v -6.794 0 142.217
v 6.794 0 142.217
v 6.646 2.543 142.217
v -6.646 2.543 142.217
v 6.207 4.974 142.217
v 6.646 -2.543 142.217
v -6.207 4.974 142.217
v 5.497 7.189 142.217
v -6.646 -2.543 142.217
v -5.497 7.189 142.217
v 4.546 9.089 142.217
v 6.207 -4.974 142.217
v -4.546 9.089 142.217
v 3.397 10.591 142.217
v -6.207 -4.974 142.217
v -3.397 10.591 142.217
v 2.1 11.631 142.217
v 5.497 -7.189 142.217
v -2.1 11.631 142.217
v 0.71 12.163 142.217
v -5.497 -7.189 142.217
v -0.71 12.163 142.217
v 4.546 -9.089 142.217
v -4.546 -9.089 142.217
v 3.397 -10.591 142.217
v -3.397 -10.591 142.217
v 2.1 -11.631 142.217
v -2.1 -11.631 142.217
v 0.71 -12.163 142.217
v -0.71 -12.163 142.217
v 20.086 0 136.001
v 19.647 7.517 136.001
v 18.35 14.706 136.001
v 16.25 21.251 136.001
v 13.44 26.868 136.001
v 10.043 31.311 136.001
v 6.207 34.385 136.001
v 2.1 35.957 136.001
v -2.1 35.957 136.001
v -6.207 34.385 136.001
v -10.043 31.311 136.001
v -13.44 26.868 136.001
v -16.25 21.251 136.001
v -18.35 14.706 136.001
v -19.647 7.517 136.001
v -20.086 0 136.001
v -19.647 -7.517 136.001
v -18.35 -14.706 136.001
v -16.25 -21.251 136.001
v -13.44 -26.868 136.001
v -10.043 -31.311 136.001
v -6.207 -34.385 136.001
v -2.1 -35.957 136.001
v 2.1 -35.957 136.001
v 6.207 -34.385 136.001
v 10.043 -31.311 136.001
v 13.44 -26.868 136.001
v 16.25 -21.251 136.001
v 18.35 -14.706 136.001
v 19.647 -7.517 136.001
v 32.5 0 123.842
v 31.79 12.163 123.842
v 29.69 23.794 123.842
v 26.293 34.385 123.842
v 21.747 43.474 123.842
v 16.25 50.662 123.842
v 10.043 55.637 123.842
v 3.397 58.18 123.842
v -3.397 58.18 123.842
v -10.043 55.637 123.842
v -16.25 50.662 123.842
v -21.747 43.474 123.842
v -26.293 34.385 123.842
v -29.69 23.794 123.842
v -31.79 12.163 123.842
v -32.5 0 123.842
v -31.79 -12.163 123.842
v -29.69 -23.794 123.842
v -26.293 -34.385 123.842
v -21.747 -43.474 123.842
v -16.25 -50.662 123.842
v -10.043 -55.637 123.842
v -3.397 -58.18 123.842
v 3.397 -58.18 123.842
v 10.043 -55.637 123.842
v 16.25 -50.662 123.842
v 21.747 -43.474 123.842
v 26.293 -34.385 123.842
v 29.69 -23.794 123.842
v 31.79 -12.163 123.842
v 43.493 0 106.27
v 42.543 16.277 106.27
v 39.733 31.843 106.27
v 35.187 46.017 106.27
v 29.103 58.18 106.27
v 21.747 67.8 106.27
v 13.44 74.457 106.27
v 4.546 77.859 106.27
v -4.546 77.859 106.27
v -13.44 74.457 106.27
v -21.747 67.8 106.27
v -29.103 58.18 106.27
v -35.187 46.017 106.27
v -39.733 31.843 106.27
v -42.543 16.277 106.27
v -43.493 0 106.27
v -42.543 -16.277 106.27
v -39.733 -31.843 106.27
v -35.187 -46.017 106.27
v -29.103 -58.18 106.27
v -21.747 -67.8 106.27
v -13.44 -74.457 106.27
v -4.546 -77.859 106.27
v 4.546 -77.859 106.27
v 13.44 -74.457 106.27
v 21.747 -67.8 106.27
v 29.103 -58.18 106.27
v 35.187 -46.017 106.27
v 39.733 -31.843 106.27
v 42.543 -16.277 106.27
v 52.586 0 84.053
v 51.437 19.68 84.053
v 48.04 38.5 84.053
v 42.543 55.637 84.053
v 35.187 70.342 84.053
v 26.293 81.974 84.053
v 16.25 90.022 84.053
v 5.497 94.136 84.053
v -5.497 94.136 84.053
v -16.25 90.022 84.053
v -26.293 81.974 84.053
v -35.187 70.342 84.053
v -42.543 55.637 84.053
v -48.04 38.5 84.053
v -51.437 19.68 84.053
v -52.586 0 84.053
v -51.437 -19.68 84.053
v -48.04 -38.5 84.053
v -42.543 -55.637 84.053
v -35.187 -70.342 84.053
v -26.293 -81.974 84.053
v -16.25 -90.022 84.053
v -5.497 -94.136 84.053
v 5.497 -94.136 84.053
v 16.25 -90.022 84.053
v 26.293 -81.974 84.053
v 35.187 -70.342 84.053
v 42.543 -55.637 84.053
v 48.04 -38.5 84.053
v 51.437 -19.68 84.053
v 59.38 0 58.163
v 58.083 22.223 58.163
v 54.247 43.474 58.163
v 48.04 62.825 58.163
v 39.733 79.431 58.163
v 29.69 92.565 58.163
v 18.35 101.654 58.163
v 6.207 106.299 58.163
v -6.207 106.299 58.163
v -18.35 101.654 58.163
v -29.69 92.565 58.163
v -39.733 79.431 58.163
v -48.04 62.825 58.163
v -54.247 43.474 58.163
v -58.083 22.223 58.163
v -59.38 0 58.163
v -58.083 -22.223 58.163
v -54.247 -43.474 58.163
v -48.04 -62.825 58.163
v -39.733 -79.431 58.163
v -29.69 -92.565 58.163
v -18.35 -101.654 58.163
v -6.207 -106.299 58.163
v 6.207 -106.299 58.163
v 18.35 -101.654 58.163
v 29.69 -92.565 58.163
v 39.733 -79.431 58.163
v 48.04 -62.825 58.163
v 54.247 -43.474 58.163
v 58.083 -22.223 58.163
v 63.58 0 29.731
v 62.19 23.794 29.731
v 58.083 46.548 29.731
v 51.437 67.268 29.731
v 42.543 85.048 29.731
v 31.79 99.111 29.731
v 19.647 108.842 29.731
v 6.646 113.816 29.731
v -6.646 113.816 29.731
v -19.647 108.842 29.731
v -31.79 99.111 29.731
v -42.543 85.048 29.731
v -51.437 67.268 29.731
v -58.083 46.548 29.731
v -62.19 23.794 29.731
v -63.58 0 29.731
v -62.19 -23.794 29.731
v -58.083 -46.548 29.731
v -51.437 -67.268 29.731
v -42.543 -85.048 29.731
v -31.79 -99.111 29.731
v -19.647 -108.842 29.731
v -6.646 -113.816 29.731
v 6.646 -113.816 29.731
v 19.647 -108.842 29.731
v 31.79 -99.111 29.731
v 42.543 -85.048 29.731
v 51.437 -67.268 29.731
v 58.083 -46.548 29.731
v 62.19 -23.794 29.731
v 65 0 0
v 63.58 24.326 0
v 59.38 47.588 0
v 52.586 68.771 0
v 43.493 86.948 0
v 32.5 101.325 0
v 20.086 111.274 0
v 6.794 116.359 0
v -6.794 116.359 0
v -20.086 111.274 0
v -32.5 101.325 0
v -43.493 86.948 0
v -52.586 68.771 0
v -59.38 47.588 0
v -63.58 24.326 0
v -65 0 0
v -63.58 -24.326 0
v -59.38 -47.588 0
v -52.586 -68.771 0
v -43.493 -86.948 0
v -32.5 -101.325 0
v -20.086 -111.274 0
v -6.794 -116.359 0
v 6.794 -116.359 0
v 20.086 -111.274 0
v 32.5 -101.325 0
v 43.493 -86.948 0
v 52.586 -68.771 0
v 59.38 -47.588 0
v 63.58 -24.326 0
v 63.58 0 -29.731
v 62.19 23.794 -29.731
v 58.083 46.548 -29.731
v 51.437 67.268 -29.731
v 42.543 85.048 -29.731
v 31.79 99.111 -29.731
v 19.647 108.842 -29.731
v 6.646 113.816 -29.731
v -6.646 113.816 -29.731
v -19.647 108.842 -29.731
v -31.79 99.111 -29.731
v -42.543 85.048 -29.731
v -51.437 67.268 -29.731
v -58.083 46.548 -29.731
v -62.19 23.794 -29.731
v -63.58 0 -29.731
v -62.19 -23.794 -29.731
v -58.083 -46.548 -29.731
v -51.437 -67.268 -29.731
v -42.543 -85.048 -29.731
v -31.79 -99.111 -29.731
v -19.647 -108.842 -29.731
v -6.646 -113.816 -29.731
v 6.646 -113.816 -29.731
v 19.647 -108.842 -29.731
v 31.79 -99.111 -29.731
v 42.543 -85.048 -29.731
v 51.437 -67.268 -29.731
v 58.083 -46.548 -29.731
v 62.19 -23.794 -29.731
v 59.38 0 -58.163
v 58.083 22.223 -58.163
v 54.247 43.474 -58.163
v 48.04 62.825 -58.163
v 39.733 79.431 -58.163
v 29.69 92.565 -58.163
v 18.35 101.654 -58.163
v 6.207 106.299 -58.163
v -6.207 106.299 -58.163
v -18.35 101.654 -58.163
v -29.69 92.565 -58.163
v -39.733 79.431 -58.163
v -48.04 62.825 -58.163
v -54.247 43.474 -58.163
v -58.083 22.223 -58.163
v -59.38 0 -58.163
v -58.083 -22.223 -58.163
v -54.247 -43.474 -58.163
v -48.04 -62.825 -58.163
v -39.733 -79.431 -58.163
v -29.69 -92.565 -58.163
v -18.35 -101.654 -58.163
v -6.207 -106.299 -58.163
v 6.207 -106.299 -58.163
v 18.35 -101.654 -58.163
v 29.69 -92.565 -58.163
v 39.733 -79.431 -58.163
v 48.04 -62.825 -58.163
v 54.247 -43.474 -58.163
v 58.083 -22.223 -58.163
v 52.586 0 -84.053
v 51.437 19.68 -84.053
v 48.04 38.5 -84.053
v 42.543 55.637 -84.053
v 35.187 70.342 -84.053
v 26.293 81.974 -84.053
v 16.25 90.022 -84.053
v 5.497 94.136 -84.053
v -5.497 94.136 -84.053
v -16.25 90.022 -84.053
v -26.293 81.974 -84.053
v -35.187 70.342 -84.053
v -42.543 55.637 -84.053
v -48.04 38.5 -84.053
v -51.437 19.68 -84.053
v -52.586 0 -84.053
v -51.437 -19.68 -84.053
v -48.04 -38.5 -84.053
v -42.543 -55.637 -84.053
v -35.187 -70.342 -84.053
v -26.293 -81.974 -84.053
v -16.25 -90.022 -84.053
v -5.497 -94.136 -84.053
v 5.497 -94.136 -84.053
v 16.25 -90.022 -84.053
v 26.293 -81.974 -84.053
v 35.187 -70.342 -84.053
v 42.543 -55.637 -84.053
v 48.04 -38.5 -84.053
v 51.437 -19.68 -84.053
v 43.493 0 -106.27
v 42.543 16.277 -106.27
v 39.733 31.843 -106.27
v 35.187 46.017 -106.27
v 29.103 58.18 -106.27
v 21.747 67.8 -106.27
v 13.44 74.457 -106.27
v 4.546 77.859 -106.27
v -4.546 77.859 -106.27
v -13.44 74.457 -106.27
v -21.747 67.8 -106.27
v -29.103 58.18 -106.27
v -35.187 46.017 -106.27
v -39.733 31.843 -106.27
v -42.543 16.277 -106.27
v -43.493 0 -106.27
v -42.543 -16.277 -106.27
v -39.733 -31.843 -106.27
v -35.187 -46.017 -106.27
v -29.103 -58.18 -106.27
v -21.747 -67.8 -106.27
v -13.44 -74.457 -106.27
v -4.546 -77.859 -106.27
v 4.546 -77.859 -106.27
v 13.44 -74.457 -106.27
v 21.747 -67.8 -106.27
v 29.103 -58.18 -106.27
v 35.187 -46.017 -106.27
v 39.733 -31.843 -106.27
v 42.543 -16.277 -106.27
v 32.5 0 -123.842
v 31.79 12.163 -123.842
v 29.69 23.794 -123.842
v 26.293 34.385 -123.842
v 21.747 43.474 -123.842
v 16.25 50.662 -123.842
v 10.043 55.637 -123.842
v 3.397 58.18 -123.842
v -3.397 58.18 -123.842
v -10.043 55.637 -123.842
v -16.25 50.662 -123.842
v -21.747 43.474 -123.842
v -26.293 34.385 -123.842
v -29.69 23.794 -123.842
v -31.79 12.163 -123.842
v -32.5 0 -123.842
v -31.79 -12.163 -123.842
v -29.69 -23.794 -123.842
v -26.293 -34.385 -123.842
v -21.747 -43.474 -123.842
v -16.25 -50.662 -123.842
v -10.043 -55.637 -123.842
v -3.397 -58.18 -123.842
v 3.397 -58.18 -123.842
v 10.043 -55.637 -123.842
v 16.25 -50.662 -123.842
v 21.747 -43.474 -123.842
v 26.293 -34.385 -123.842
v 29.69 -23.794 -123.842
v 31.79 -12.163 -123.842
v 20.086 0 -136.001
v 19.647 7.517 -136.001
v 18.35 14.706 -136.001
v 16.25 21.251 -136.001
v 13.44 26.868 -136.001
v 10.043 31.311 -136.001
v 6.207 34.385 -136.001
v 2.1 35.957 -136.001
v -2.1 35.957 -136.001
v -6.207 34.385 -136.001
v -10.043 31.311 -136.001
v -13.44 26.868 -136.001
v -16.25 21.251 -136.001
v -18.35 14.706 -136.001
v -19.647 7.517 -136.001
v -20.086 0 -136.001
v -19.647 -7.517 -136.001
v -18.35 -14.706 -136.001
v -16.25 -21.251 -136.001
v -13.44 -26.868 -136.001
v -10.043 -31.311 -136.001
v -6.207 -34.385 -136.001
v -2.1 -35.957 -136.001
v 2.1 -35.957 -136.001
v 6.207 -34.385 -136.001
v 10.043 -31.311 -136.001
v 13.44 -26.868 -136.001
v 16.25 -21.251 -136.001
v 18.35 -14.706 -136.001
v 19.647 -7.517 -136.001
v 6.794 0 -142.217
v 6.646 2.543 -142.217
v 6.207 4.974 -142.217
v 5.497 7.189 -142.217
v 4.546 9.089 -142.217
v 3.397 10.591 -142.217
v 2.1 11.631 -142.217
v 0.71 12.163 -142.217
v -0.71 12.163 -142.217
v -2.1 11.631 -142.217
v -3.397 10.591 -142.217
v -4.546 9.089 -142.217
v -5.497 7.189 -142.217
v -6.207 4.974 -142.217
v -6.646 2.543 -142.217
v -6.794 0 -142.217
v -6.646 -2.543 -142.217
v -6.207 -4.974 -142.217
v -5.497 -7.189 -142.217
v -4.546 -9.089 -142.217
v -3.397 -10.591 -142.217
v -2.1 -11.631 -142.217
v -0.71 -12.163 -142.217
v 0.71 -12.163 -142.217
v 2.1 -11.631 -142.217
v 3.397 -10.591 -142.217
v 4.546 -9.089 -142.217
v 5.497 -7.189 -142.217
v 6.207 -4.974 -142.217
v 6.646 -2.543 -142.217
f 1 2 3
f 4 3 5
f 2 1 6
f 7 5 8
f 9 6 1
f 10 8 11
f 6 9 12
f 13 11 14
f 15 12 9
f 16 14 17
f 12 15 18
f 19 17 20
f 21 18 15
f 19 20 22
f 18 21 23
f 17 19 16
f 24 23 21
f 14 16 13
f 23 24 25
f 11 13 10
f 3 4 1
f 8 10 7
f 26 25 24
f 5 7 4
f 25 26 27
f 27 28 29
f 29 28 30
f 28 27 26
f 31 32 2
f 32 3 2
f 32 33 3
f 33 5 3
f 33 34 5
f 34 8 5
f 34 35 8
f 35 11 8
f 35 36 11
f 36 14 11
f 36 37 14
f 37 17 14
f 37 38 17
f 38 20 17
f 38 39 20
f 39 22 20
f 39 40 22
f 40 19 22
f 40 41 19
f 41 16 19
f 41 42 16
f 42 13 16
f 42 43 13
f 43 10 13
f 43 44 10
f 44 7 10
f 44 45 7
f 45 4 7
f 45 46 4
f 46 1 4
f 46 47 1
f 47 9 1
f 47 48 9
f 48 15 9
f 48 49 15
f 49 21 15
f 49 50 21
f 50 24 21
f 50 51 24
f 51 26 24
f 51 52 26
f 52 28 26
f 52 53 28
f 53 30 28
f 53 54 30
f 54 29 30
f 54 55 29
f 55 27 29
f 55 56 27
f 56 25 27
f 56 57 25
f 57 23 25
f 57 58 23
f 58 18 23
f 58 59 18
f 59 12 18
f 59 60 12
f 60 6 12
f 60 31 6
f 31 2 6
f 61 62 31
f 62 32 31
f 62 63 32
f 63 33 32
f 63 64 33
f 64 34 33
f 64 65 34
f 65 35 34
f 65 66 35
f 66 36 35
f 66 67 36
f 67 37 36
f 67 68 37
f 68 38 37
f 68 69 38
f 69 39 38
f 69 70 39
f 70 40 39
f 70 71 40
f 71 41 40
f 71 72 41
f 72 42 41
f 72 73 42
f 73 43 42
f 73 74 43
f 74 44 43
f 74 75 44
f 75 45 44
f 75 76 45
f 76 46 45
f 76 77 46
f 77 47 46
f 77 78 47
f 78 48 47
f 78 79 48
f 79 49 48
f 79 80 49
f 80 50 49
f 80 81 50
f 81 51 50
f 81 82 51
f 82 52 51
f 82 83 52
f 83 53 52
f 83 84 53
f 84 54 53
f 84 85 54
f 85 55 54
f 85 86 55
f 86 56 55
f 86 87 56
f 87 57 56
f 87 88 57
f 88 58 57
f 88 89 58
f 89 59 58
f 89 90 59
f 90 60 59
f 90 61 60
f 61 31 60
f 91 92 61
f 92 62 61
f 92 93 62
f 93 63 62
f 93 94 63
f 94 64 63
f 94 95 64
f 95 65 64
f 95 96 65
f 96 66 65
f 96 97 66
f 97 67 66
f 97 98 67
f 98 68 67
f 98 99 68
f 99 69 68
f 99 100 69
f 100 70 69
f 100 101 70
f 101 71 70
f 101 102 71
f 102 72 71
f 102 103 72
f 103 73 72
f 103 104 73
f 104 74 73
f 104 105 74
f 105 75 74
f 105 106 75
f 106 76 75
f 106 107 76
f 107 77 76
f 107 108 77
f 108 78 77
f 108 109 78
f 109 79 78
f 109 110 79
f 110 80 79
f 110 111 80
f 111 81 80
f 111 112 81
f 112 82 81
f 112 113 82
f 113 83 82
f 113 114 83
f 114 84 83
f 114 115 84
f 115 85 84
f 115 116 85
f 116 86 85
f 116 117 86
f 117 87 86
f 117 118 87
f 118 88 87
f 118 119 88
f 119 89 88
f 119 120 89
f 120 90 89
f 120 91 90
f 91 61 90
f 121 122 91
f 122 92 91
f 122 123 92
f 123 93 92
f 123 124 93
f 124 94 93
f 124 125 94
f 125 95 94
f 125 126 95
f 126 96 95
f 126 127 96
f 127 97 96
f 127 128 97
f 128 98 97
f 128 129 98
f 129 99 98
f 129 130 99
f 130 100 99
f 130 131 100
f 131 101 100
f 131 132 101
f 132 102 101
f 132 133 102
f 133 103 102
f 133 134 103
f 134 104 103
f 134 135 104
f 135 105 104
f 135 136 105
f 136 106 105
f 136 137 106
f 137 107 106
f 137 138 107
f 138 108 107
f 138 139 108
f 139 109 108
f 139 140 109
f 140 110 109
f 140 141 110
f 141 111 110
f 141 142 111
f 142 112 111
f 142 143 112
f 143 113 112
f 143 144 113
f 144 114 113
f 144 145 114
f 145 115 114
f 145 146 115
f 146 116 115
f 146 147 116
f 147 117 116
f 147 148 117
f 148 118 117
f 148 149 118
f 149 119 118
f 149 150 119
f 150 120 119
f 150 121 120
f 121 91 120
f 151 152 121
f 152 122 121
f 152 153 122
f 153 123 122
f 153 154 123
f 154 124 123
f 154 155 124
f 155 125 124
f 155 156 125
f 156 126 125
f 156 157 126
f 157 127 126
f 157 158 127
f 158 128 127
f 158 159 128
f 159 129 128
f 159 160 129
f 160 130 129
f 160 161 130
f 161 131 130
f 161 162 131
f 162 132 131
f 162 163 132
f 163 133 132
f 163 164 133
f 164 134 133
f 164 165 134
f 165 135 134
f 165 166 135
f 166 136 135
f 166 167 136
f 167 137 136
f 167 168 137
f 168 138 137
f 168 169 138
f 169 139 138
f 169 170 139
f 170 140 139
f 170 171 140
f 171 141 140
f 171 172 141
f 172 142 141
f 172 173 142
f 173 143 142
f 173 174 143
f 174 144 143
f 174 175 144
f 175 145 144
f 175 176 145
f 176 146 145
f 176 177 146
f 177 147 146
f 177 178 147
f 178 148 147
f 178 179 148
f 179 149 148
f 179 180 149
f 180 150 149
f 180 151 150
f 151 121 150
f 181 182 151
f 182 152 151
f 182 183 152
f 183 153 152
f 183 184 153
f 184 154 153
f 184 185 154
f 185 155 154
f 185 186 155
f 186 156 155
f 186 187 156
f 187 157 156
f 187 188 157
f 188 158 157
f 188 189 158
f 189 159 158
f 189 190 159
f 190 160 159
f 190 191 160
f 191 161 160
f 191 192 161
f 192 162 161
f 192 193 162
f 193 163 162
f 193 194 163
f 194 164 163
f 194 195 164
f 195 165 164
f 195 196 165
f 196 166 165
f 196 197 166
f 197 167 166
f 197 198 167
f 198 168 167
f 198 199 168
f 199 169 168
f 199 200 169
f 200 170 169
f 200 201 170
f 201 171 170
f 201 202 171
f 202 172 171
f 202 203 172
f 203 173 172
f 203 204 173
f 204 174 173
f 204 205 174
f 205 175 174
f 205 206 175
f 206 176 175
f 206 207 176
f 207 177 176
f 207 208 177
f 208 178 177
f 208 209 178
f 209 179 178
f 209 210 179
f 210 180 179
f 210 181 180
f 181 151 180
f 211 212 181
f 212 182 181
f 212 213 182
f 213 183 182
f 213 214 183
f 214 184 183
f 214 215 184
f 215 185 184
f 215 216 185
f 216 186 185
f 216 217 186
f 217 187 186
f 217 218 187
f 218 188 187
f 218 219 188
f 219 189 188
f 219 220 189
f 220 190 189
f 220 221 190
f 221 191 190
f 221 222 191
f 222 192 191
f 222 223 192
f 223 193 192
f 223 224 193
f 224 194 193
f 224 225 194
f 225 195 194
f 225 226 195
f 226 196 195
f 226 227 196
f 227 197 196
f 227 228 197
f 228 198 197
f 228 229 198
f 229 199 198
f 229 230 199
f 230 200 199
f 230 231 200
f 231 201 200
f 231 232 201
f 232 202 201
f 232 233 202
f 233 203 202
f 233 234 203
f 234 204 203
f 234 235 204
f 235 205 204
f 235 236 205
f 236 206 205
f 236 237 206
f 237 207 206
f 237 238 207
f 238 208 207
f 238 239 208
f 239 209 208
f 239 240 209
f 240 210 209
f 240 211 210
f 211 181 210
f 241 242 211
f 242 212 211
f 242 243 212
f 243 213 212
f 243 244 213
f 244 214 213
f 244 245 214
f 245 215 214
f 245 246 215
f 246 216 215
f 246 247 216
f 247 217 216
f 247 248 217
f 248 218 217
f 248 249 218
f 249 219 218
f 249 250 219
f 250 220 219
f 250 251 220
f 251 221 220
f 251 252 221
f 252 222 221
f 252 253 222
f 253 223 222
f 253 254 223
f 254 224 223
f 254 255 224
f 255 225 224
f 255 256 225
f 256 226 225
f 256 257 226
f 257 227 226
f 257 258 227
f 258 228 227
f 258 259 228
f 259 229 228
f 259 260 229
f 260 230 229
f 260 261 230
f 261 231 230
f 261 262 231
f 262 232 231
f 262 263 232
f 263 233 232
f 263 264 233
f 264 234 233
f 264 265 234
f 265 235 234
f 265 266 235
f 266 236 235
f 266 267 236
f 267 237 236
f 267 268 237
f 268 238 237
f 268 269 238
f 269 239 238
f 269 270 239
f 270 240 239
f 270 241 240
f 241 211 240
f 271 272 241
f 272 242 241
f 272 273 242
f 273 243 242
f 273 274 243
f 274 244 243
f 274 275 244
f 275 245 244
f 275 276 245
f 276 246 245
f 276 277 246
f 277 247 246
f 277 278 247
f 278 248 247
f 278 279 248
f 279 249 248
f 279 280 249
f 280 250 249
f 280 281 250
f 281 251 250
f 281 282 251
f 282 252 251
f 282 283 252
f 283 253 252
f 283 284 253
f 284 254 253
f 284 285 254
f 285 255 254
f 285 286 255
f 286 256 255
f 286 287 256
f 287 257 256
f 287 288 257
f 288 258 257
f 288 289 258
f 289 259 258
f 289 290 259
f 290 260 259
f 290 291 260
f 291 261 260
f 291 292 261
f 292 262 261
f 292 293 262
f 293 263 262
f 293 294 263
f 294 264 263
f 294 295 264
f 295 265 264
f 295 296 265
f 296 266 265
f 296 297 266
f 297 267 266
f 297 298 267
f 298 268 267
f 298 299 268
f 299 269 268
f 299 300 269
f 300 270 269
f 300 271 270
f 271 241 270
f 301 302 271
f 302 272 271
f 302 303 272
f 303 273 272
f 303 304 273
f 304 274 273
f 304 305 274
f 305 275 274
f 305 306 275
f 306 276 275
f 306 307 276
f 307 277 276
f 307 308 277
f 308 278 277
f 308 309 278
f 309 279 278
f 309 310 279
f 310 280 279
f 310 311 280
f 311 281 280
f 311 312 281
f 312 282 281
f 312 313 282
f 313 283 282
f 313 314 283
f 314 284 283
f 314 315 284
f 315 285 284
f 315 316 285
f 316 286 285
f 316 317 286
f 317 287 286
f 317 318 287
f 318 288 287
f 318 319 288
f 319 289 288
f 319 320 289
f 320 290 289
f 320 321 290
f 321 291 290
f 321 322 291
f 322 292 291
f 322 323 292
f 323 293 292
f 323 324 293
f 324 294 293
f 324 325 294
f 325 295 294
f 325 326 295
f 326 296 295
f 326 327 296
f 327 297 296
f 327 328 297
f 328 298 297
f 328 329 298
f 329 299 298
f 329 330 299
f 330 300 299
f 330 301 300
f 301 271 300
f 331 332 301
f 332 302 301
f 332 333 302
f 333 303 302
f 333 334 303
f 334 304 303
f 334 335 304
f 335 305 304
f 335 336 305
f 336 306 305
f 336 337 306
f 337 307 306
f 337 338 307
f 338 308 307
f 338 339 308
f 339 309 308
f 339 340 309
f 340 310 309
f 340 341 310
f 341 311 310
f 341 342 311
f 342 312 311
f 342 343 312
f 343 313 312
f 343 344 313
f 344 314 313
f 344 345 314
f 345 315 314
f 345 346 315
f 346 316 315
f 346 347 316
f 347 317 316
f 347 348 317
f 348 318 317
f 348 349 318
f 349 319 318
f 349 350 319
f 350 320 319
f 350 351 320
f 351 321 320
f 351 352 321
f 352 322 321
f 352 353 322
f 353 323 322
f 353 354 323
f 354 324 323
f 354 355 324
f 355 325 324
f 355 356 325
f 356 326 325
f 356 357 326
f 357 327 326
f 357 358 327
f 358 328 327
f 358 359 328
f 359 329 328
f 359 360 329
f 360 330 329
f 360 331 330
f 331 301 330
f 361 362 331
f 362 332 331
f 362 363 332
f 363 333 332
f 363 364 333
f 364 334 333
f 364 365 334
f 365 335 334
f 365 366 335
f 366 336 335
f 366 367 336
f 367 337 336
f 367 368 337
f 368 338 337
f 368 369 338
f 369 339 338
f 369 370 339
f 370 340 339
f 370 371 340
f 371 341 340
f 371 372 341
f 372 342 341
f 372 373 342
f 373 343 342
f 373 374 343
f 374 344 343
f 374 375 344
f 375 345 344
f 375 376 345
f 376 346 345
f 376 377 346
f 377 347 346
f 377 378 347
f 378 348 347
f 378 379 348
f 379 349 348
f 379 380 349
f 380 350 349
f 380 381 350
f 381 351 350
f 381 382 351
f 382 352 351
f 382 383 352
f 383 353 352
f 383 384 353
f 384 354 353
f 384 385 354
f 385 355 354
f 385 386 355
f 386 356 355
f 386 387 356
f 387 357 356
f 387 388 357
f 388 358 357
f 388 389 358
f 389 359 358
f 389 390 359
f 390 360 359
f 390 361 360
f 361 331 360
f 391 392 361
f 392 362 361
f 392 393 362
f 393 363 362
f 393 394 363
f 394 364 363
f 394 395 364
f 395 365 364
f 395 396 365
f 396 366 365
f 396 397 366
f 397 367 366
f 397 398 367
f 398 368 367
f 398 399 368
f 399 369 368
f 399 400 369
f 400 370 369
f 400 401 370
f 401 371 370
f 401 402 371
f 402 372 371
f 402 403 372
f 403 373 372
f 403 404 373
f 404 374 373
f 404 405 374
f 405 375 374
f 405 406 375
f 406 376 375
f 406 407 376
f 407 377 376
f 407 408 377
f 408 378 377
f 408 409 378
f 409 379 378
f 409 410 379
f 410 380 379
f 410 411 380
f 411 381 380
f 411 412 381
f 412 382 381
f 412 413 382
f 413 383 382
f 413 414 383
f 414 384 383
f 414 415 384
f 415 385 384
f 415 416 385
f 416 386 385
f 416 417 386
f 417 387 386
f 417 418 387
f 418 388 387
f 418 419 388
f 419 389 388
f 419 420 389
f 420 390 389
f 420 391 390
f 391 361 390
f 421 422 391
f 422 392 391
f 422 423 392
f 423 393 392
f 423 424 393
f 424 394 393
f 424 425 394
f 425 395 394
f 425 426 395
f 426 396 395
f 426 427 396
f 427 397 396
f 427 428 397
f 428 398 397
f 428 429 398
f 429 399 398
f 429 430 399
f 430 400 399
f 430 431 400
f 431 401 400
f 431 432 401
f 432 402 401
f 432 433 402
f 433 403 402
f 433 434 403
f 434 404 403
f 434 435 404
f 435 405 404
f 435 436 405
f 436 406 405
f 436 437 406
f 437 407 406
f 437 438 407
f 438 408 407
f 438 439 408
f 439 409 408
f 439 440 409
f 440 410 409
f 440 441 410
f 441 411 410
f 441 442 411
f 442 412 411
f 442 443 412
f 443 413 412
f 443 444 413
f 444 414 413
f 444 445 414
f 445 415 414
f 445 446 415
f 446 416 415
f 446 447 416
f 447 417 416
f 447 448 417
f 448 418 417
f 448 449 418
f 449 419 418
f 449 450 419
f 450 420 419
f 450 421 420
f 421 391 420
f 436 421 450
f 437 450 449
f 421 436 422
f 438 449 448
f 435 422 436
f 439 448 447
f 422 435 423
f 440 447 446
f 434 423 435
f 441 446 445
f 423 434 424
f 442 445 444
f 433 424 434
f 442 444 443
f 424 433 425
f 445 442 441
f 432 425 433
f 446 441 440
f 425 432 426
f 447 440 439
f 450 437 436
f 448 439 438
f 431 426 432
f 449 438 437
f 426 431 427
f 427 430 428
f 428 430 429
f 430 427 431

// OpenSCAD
// Generated by SolidPython 1.0.1 on 2020-07-29 00:46:46


scale(v = [5, 9, 11]) {
	sphere(r = 13);
}
/***********************************************
*********      SolidPython code:      **********
************************************************
 
# import packages: SolidPython
from solid import *
from solid.utils import *
from itertools import chain, combinations, permutations


class Resize:

    def __init__(self, scad_file):
        self.scad_file = scad_file
        #self.scad_file = import_scad(scad_file)
        # cone/cylinder param:
        self.r1 = 0
        self.r2 = 0
        self.h = 0
        # rectangular prism param:
        self.w = 0
        self.l = 0
        # ellipse param:
        self.r = 0

    # import OpenScad code (file name corresponds to shape)


    # classify shape + parameters
    def assign(self, param1, param2, param3):
        if self.scad_file == 'cone.scad':
            self.r1 = param1
            self.r2 = param2
            self.h = param3
        elif self.scad_file == 'cylinder.scad':
            self.r1 = param1
            self.r2 = param2
            self.h = param3
        elif self.scad_file == 'rectangularPrism.scad':
            self.h = param1
            self.l = param2
            self.w = param3
        else:
            self.r = param1
            self.h = param2

    # resize parameters
    def iterate(self):
        x = range(3, 20, 2)
        i = 1
        if self.scad_file == 'cone.scad':
            tempList = list(permutations(x, 2))
            for temp in tempList:
                param1 = temp[0]
                param2 = temp[1]
                filepath = 'produced_scad_files/' + 'cone' + str(param1) + '_' + str(param2) + '_' + '.scad'
                scad_render_to_file(cylinder(h=param1, r1=param2, r2=0), filepath)

        elif self.scad_file == 'cylinder.scad':
            tempList = list(permutations(x, 3))
            for temp in tempList:
                param1 = temp[0]
                param2 = temp[1]
                filepath = 'produced_scad_files/' + 'cylinder' + str(param1) + '_' + str(param2) + '_' + '.scad'
                scad_render_to_file(cylinder(h=param1, r1=param2, r2=param2), filepath)

        elif self.scad_file == 'rectangularPrism.scad':
            tempList = list(permutations(x, 3))
            for temp in tempList:
                param1 = temp[0]
                param2 = temp[1]
                param3 = temp[2]
                filepath = 'produced_scad_files/' + 'rectangularPrism' + str(param1) + '_' + str(param2) + '_' + str(
                    param3) + '.scad'
                scad_render_to_file(cube(size=(param1, param2, param3)), filepath)

        elif self.scad_file == 'ellipse.scad':
            tempList = list(permutations(x, 4))
            for temp in tempList:
                param1 = temp[0]
                param2 = temp[1]
                param3 = temp[2]
                param4 = temp[3]
                filepath = 'produced_scad_files/' + 'ellipse' + str(param1) + '_' + str(param2) + '_' + str(param3) + '_' + str(param4) + '.scad'
                scad_render_to_file(scale([param1, param2, param3])(sphere(r=param4)), filepath)

    def render_to_scadfile(self):
        scad_render_to_file(scad, 'example.scad') 
 
************************************************/
